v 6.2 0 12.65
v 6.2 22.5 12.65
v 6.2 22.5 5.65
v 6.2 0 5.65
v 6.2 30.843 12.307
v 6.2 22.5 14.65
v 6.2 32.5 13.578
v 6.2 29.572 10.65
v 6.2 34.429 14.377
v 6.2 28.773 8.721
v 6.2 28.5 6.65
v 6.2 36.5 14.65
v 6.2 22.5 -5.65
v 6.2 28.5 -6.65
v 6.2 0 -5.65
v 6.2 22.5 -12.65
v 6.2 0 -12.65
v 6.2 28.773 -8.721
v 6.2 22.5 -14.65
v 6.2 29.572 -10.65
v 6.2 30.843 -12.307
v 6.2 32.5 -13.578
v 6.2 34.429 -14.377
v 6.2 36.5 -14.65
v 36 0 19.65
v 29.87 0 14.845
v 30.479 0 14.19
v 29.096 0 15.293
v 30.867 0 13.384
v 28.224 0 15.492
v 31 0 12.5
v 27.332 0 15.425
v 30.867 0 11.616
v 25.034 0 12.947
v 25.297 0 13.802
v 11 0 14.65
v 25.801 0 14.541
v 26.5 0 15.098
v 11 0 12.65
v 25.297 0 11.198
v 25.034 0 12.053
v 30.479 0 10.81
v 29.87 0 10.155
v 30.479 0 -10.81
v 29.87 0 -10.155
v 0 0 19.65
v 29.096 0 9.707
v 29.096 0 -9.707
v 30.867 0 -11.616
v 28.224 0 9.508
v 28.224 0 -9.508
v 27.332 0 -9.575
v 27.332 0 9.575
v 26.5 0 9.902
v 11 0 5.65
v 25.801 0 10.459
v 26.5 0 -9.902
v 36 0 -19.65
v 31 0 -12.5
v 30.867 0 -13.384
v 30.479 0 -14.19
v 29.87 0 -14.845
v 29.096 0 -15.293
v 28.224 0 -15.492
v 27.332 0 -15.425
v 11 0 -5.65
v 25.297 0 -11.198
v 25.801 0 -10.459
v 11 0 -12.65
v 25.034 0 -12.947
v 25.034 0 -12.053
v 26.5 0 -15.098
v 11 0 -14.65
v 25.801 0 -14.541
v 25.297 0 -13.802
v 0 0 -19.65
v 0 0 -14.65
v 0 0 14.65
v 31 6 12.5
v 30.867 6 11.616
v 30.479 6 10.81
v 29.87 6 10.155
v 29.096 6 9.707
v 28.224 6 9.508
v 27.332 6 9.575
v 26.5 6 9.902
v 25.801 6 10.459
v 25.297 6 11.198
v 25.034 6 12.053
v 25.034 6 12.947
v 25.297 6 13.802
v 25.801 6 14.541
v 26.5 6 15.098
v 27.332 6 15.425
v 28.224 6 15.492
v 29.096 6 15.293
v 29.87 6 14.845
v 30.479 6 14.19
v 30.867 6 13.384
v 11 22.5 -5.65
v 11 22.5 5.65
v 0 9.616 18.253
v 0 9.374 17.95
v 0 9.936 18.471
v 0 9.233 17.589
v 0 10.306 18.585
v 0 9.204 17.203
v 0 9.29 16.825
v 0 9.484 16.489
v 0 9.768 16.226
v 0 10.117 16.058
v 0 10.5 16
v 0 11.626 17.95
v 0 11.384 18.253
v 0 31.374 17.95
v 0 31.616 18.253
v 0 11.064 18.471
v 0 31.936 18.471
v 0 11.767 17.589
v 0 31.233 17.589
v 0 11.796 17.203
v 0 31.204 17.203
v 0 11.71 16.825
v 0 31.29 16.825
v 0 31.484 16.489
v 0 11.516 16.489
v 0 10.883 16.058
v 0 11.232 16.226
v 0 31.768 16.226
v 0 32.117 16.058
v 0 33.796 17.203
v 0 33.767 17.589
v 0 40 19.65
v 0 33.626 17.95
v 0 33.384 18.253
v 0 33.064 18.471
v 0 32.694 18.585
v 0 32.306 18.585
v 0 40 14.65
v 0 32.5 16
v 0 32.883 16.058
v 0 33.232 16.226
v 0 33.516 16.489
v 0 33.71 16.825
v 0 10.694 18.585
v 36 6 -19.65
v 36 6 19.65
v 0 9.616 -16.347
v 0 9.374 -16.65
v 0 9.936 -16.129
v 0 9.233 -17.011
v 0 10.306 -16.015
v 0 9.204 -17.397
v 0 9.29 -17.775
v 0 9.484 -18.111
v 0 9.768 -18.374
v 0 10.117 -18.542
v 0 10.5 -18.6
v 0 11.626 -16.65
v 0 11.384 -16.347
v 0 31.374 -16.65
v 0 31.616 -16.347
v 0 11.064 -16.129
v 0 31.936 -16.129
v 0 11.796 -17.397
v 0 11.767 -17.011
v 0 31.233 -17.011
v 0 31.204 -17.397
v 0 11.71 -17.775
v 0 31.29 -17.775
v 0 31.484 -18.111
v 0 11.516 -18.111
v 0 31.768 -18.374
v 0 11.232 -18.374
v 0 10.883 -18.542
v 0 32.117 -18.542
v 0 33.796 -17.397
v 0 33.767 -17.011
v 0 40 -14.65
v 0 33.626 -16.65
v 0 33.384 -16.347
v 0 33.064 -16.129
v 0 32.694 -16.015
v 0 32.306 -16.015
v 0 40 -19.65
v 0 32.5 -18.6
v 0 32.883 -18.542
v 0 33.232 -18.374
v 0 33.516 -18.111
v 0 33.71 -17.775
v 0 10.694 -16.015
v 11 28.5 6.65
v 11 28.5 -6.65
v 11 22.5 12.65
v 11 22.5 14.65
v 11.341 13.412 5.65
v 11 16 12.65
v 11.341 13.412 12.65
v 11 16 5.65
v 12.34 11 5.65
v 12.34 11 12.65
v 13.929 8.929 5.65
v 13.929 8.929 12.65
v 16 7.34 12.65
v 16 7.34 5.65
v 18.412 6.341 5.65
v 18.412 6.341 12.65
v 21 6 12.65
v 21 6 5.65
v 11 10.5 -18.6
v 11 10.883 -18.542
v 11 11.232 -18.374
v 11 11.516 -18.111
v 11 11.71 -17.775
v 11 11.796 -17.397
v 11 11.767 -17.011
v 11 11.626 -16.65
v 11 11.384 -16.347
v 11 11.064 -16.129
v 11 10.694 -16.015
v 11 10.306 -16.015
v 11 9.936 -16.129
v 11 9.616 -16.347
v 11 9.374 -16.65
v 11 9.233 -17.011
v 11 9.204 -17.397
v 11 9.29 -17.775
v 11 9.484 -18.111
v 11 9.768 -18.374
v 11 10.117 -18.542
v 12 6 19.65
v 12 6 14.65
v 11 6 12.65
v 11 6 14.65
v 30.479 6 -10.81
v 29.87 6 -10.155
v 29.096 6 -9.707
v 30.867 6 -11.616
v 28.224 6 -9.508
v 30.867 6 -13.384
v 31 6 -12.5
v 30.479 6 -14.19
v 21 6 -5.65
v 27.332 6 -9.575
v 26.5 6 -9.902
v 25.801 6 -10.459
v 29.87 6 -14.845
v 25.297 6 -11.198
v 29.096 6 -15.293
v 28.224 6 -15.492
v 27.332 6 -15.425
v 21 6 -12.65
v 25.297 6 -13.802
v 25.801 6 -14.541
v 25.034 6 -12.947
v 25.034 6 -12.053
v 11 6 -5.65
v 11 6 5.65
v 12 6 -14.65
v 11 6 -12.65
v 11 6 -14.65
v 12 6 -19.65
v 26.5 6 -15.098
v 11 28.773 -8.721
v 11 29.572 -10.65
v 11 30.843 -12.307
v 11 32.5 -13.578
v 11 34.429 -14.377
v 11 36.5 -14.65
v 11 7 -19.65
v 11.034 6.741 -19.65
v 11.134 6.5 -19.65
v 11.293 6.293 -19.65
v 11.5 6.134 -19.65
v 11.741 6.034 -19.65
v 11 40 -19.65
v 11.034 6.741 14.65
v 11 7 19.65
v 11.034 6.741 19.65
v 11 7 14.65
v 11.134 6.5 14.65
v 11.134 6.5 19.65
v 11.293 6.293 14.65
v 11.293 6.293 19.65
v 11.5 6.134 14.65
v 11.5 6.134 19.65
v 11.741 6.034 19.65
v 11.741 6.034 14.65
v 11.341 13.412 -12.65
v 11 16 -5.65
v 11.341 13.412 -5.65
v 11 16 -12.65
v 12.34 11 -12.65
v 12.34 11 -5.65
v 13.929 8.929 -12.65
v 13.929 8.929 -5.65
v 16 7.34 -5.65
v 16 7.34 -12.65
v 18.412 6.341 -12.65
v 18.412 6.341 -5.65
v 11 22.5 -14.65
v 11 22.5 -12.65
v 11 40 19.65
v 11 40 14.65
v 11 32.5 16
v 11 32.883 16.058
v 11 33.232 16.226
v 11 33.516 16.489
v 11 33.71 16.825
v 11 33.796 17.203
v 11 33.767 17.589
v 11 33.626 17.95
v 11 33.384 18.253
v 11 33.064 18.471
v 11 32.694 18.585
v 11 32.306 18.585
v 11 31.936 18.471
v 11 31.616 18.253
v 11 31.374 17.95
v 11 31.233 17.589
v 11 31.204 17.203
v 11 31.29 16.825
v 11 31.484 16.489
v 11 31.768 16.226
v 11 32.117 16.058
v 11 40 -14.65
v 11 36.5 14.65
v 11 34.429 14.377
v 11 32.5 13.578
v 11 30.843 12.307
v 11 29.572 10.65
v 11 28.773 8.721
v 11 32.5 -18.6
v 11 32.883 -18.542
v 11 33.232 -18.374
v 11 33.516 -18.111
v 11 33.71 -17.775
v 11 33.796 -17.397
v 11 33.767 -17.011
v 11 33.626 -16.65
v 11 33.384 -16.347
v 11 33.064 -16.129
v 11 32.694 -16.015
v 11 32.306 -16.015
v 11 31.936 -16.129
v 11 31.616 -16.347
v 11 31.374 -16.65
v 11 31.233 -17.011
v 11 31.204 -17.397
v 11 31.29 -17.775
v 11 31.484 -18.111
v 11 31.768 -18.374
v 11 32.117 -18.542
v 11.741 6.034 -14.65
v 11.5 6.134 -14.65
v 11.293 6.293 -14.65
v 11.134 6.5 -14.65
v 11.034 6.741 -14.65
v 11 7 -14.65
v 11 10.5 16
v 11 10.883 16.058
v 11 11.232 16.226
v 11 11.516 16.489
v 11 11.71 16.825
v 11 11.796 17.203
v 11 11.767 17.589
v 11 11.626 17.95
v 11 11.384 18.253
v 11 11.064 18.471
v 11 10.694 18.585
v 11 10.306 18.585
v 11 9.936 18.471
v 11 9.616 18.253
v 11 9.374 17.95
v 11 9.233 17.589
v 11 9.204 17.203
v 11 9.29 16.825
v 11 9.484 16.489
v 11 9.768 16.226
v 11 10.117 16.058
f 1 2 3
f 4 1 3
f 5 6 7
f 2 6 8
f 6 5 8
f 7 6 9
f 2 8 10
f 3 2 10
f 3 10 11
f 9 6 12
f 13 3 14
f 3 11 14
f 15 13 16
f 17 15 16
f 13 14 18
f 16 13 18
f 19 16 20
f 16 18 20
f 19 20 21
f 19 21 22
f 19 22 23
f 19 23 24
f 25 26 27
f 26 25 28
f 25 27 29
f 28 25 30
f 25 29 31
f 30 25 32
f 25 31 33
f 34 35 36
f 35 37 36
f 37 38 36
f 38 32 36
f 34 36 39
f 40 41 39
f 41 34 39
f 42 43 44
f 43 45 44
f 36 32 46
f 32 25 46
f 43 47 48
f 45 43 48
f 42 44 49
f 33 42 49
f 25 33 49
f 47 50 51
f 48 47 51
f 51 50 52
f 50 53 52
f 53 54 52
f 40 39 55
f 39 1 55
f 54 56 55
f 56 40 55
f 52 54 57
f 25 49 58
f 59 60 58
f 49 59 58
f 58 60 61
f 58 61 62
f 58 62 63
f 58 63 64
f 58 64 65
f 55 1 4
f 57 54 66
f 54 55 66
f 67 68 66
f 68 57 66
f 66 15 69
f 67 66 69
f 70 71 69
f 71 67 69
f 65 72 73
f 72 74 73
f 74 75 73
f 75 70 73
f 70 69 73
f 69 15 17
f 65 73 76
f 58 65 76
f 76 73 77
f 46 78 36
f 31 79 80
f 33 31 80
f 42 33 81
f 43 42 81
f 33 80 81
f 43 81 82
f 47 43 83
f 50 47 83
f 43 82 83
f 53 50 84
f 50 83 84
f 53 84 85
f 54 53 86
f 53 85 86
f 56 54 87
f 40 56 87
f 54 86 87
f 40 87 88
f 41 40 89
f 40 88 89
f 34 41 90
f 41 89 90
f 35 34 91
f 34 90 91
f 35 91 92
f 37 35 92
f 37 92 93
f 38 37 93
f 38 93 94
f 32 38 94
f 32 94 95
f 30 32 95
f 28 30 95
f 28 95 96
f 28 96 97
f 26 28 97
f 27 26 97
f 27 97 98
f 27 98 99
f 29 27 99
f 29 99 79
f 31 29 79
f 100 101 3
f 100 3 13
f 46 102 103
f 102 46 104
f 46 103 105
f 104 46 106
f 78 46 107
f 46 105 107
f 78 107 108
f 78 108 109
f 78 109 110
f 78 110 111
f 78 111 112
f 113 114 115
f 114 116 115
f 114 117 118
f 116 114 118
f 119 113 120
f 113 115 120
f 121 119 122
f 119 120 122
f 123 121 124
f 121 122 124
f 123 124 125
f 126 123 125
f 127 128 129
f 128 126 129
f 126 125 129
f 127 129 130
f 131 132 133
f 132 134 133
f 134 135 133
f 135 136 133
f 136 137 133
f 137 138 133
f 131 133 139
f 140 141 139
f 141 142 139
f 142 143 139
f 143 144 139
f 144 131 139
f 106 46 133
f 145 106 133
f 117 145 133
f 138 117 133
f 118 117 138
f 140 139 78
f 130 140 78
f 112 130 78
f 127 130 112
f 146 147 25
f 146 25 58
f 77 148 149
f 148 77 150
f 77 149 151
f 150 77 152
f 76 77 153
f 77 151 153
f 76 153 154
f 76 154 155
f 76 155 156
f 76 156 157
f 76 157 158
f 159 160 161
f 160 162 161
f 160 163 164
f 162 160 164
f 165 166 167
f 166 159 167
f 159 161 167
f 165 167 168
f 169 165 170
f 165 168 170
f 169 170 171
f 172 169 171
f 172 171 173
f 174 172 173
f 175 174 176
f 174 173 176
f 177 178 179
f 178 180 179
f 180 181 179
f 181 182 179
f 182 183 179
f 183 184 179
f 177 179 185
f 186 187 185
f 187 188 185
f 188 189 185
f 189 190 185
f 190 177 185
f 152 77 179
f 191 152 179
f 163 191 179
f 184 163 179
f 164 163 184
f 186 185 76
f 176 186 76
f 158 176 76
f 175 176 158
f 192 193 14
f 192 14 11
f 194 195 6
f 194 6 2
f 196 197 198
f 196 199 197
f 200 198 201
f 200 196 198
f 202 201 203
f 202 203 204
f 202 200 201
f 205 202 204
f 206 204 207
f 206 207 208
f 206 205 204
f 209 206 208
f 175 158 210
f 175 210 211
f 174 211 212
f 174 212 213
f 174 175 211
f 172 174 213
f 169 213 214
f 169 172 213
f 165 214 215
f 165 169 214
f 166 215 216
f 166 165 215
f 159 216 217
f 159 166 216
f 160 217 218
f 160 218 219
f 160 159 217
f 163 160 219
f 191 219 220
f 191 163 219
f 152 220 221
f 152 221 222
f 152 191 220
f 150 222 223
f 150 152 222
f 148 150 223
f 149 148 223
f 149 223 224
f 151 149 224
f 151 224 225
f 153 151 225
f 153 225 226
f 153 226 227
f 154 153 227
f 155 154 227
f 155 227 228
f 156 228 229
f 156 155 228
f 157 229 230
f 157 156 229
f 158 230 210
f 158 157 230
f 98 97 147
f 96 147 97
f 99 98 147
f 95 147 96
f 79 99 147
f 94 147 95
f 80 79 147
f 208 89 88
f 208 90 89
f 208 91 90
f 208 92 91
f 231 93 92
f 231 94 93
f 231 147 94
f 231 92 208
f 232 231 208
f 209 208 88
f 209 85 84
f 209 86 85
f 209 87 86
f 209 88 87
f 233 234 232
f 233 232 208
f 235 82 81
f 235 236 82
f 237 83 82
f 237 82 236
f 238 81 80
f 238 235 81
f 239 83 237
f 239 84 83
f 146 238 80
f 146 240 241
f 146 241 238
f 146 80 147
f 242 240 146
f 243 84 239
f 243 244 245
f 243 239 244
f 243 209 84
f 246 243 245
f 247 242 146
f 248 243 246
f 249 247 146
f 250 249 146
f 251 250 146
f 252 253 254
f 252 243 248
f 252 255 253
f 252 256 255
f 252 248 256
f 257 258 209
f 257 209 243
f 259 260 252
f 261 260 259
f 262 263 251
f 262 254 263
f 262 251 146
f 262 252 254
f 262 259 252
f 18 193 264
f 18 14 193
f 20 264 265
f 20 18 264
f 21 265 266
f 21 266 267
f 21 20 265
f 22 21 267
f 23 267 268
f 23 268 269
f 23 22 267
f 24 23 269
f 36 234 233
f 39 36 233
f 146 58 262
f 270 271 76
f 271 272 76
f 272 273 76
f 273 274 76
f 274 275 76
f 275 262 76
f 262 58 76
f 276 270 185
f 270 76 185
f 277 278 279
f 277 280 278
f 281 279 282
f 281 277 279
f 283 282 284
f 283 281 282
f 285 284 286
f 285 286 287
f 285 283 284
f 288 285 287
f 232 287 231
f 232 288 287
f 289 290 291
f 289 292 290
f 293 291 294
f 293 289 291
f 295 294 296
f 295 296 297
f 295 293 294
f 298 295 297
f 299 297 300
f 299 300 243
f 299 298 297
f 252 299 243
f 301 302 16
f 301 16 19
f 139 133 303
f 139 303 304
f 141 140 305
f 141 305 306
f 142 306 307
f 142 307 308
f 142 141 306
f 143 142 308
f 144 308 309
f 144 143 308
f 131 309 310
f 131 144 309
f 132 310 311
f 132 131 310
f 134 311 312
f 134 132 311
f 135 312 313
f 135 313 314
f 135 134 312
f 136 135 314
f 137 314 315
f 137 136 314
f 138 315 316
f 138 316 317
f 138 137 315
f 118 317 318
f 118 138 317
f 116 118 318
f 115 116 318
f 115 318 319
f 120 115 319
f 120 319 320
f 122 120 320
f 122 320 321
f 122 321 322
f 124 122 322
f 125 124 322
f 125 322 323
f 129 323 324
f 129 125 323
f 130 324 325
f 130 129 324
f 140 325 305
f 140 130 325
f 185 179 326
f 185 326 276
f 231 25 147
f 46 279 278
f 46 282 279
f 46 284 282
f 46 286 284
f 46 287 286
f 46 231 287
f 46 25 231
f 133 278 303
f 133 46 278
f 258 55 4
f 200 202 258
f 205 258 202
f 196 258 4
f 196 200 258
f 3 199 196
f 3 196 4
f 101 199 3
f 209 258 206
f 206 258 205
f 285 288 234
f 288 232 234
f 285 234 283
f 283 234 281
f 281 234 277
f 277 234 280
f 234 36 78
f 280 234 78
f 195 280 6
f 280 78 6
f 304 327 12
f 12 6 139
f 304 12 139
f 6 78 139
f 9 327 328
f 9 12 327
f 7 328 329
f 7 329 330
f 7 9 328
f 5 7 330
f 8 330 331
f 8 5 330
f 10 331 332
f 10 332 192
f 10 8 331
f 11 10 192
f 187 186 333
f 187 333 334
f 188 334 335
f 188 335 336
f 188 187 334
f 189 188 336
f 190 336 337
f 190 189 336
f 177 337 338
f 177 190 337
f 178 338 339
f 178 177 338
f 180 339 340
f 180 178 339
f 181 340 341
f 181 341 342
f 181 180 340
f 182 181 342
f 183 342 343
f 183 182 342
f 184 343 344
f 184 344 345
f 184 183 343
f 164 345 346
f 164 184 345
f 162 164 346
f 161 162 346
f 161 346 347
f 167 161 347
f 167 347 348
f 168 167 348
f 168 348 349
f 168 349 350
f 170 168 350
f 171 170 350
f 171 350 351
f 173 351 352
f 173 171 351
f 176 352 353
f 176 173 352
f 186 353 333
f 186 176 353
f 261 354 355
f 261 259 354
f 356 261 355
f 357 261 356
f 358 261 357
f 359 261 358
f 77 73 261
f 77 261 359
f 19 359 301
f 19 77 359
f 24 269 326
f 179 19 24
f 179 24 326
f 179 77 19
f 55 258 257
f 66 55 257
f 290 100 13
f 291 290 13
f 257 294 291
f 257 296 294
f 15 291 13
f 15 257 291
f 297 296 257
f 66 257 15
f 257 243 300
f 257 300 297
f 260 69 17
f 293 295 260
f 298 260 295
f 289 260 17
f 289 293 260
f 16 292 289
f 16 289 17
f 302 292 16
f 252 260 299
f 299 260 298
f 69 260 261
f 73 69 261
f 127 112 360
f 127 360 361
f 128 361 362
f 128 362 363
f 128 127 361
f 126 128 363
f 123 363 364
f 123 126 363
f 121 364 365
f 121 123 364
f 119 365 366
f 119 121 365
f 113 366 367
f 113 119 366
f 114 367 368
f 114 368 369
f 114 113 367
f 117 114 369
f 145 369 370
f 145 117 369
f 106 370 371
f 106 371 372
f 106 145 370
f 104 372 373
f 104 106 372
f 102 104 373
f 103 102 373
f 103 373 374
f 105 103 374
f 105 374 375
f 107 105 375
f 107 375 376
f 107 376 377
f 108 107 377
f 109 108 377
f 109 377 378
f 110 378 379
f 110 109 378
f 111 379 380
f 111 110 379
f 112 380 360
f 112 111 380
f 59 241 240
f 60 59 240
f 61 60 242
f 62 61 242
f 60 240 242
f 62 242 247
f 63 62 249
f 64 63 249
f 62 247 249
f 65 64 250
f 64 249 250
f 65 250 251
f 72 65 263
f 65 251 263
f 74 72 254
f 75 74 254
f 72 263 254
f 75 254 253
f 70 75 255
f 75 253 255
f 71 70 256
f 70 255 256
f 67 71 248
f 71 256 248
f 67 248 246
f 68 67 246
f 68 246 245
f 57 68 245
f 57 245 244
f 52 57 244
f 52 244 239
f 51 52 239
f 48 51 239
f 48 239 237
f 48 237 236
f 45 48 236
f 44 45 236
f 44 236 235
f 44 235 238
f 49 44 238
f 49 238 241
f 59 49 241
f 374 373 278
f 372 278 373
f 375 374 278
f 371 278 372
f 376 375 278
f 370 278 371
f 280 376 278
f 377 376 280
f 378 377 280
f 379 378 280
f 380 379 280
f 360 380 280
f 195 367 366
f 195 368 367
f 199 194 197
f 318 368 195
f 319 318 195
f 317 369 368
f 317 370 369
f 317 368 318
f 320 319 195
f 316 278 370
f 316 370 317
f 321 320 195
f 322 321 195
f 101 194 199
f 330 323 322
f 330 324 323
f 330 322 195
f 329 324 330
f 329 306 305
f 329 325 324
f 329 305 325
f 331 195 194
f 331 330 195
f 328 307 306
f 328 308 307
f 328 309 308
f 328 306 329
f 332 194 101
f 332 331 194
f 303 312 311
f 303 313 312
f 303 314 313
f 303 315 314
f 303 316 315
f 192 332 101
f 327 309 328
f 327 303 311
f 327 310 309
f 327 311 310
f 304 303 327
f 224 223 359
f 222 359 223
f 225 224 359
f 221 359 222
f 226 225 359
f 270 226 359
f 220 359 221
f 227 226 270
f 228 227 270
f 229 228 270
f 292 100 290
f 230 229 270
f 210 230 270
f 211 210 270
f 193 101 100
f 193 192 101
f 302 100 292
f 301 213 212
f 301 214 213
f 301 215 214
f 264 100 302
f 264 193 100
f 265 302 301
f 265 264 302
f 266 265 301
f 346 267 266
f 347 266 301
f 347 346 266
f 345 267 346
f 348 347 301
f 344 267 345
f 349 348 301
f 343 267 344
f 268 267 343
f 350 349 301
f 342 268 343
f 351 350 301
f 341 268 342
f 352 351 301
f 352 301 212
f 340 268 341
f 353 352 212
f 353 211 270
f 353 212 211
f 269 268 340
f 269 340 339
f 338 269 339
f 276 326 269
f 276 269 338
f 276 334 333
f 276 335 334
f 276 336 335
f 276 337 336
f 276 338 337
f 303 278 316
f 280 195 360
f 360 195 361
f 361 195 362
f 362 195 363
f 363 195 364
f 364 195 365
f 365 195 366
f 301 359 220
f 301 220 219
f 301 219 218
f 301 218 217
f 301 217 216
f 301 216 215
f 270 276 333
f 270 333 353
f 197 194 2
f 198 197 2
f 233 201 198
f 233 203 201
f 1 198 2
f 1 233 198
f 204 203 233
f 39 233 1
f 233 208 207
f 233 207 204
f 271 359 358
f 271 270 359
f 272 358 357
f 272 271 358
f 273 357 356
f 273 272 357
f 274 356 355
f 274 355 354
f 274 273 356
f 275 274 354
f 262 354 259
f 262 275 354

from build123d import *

# Parameters (mm, degrees)
SKETCH1_W             = 5
SKETCH1_H             = 40
SKETCH1_R             = 1.3
BOSS_EXTRUDE1_DEPTH   = 11
BOSS_EXTRUDE1_2_DEPTH = 11
SKETCH2_W             = 39.3
SKETCH2_H             = 6
BOSS_EXTRUDE2_DEPTH   = 25
BOSS_EXTRUDE3_DEPTH   = 4.8
FILLET1_R             = 1
SKETCH4_R             = 3
CUT_EXTRUDE1_DEPTH    = 34
FILLET2_R             = 10
FILLET3_R             = 8


with BuildPart() as part:
    # Sketch1 → Boss-Extrude1 (new body)
    with BuildSketch(Plane(origin=(0, 0, 0), x_dir=(0, 0, -1), z_dir=(1, 0, 0))):
        with Locations((-17.15, 20)):
            Rectangle(SKETCH1_W, SKETCH1_H)
        with Locations((-17.3, 32.5)):
            Circle(SKETCH1_R, mode=Mode.SUBTRACT)
        with Locations((-17.3, 10.5)):
            Circle(SKETCH1_R, mode=Mode.SUBTRACT)
    extrude(amount=BOSS_EXTRUDE1_DEPTH)



with BuildPart() as body_2:
    # Sketch1 → Boss-Extrude1 2 (new body)
    with BuildSketch(Plane(origin=(0, 0, 0), x_dir=(0, 0, -1), z_dir=(1, 0, 0))):
        with Locations((17.15, 20)):
            Rectangle(SKETCH1_W, SKETCH1_H)
        with Locations((17.3, 10.5)):
            Circle(SKETCH1_R, mode=Mode.SUBTRACT)
        with Locations((17.3, 32.5)):
            Circle(SKETCH1_R, mode=Mode.SUBTRACT)
    extrude(amount=BOSS_EXTRUDE1_2_DEPTH)


with BuildPart() as part_1:
    add(part.part)

    add(body_2.part)  # Boss-Extrude2 merges body 2
    # Sketch2 → Boss-Extrude2 (add)
    with BuildSketch(Plane(origin=(11, 0, 0), x_dir=(0, 0, -1), z_dir=(1, 0, 0))):
        with Locations((0, 3)):
            Rectangle(SKETCH2_W, SKETCH2_H)
    extrude(amount=BOSS_EXTRUDE2_DEPTH)

    # Sketch3 → Boss-Extrude3 (add)
    with BuildSketch(Plane(origin=(11, 0, 0), x_dir=(0, 0, -1), z_dir=(1, 0, 0))):
        Polygon((-14.65, 22.5), (-12.65, 22.5), (-12.65, 0), (-5.65, 0), (-5.65, 22.5), (5.65, 22.5), (5.65, 0), (12.65, 0), (12.65, 22.5), (14.65, 22.5), (14.65, 28.5), (-14.65, 28.5), align=None)
    extrude(amount=-BOSS_EXTRUDE3_DEPTH)

    # Fillet1
    fillet1_edges = [part_1.edges().sort_by_distance(p)[0] for p in [
        (11, 6, 17.15),
        (11, 6, -17.15),
    ]]
    fillet(fillet1_edges, radius=FILLET1_R)

    # Sketch4 → Cut-Extrude1 (cut)
    with BuildSketch(Plane(origin=(0, 6, 0), x_dir=(1, 0, 0), z_dir=(0, 1, 0))):
        with Locations((28, 12.5)):
            Circle(SKETCH4_R)
        with Locations((28, -12.5)):
            Circle(SKETCH4_R)
    extrude(amount=-CUT_EXTRUDE1_DEPTH, mode=Mode.SUBTRACT)

    # Fillet2
    fillet2_edges = [part_1.edges().sort_by_distance(p)[0] for p in [
        (11, 6, 9.15),
        (11, 6, -9.15),
    ]]
    fillet(fillet2_edges, radius=FILLET2_R)

    # Fillet3
    fillet3_edges = [part_1.edges().sort_by_distance(p)[0] for p in [
        (8.6, 28.5, 14.65),
        (8.6, 28.5, -14.65),
    ]]
    fillet(fillet3_edges, radius=FILLET3_R)


solid = part_1.part
